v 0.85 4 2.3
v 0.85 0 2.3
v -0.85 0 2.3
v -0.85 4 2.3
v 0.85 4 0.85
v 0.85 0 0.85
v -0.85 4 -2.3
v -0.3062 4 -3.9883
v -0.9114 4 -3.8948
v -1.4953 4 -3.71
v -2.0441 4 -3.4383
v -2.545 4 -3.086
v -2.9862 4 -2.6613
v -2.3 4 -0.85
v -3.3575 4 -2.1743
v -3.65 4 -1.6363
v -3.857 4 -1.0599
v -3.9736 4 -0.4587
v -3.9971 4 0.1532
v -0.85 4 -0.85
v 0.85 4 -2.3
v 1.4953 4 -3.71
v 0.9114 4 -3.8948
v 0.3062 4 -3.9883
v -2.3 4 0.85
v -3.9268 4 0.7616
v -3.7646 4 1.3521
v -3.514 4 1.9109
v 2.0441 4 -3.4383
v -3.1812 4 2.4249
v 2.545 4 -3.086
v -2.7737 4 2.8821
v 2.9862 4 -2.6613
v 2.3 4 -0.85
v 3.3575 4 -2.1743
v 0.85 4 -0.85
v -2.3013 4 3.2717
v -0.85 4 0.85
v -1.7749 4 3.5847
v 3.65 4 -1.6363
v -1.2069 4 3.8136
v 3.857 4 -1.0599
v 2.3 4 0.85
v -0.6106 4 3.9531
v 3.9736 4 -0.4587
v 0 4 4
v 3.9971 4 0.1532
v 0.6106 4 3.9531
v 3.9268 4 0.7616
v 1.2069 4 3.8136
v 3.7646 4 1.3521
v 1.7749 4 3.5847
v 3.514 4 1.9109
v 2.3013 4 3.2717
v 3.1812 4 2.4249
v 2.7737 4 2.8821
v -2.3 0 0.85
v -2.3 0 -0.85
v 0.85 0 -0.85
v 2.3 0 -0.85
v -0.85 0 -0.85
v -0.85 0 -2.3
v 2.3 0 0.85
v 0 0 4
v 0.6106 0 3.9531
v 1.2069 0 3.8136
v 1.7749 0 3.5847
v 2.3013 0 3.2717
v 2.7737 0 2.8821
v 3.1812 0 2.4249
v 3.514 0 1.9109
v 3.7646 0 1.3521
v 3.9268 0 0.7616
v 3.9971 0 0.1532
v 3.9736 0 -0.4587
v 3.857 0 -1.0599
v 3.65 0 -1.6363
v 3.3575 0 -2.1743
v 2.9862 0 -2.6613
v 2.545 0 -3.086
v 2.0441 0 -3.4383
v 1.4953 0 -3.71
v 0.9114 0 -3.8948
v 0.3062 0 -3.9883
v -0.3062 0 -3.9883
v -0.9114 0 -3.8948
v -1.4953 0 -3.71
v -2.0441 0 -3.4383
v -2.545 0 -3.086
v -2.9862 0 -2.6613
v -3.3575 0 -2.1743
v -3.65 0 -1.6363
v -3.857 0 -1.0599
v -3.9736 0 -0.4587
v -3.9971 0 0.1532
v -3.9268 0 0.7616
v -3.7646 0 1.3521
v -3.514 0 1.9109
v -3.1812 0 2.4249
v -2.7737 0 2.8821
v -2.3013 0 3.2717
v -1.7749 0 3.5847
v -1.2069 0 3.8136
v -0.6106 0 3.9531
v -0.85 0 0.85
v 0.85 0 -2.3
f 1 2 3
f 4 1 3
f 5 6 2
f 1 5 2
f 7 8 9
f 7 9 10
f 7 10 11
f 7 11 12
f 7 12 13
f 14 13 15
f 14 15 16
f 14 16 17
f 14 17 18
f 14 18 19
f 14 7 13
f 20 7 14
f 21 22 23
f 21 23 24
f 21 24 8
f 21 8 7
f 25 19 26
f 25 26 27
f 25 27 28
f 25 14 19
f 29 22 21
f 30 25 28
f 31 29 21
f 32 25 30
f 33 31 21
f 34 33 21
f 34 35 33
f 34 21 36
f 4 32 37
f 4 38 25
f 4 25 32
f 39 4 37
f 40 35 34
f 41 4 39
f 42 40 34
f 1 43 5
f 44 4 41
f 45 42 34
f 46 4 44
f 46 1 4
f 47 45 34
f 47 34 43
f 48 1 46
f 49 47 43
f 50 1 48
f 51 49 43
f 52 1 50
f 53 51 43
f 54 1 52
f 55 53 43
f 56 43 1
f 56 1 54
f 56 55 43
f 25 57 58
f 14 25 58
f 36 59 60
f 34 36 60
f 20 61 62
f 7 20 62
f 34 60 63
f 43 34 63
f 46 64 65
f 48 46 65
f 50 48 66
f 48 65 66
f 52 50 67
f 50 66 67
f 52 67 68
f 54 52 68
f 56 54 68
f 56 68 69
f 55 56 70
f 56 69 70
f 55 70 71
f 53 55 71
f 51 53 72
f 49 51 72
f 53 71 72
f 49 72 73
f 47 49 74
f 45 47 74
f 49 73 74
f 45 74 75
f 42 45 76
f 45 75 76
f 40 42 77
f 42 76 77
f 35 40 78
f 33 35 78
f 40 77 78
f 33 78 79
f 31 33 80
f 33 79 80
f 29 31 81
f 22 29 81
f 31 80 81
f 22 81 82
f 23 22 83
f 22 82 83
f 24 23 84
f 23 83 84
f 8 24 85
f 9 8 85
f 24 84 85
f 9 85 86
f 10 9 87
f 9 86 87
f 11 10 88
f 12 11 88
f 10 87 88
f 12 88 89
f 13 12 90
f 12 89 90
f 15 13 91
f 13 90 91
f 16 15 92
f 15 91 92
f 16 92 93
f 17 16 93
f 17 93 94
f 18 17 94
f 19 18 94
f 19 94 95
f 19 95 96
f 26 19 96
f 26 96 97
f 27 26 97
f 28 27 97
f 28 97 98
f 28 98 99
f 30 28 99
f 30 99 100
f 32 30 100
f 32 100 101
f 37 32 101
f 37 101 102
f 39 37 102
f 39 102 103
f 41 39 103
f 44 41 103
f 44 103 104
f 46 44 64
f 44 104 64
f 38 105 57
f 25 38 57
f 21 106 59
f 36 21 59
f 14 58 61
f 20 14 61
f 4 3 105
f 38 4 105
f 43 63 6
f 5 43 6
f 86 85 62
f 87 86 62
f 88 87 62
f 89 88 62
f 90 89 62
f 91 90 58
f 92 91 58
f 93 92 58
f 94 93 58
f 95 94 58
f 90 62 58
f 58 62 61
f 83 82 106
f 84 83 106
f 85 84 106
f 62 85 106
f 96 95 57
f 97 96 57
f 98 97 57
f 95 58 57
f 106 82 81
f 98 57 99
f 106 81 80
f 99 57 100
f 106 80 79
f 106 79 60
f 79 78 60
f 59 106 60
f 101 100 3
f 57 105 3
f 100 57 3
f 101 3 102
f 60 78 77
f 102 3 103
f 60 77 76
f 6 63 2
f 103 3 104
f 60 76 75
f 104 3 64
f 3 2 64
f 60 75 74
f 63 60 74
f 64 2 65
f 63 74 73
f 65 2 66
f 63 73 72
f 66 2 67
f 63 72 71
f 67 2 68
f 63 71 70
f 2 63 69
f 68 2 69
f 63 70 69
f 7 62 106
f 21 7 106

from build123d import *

# Parameters (mm, degrees)
SKETCH2_R           = 4
BOSS_EXTRUDE1_DEPTH = 4


with BuildPart() as part:
    # Sketch2 → Boss-Extrude1 (new body)
    with BuildSketch(Plane(origin=(0, 0, 0), x_dir=(1, 0, 0), z_dir=(0, 1, 0))):
        with Locations(Location((0, 0, 0), (0, 0, 270))):
            Circle(SKETCH2_R)
        Polygon((0.85, 0.85), (2.3, 0.85), (2.3, -0.85), (0.85, -0.85), (0.85, -2.3), (-0.85, -2.3), (-0.85, -0.85), (-2.3, -0.85), (-2.3, 0.85), (-0.85, 0.85), (-0.85, 2.3), (0.85, 2.3), align=None, mode=Mode.SUBTRACT)
    extrude(amount=BOSS_EXTRUDE1_DEPTH)


solid = part.part
